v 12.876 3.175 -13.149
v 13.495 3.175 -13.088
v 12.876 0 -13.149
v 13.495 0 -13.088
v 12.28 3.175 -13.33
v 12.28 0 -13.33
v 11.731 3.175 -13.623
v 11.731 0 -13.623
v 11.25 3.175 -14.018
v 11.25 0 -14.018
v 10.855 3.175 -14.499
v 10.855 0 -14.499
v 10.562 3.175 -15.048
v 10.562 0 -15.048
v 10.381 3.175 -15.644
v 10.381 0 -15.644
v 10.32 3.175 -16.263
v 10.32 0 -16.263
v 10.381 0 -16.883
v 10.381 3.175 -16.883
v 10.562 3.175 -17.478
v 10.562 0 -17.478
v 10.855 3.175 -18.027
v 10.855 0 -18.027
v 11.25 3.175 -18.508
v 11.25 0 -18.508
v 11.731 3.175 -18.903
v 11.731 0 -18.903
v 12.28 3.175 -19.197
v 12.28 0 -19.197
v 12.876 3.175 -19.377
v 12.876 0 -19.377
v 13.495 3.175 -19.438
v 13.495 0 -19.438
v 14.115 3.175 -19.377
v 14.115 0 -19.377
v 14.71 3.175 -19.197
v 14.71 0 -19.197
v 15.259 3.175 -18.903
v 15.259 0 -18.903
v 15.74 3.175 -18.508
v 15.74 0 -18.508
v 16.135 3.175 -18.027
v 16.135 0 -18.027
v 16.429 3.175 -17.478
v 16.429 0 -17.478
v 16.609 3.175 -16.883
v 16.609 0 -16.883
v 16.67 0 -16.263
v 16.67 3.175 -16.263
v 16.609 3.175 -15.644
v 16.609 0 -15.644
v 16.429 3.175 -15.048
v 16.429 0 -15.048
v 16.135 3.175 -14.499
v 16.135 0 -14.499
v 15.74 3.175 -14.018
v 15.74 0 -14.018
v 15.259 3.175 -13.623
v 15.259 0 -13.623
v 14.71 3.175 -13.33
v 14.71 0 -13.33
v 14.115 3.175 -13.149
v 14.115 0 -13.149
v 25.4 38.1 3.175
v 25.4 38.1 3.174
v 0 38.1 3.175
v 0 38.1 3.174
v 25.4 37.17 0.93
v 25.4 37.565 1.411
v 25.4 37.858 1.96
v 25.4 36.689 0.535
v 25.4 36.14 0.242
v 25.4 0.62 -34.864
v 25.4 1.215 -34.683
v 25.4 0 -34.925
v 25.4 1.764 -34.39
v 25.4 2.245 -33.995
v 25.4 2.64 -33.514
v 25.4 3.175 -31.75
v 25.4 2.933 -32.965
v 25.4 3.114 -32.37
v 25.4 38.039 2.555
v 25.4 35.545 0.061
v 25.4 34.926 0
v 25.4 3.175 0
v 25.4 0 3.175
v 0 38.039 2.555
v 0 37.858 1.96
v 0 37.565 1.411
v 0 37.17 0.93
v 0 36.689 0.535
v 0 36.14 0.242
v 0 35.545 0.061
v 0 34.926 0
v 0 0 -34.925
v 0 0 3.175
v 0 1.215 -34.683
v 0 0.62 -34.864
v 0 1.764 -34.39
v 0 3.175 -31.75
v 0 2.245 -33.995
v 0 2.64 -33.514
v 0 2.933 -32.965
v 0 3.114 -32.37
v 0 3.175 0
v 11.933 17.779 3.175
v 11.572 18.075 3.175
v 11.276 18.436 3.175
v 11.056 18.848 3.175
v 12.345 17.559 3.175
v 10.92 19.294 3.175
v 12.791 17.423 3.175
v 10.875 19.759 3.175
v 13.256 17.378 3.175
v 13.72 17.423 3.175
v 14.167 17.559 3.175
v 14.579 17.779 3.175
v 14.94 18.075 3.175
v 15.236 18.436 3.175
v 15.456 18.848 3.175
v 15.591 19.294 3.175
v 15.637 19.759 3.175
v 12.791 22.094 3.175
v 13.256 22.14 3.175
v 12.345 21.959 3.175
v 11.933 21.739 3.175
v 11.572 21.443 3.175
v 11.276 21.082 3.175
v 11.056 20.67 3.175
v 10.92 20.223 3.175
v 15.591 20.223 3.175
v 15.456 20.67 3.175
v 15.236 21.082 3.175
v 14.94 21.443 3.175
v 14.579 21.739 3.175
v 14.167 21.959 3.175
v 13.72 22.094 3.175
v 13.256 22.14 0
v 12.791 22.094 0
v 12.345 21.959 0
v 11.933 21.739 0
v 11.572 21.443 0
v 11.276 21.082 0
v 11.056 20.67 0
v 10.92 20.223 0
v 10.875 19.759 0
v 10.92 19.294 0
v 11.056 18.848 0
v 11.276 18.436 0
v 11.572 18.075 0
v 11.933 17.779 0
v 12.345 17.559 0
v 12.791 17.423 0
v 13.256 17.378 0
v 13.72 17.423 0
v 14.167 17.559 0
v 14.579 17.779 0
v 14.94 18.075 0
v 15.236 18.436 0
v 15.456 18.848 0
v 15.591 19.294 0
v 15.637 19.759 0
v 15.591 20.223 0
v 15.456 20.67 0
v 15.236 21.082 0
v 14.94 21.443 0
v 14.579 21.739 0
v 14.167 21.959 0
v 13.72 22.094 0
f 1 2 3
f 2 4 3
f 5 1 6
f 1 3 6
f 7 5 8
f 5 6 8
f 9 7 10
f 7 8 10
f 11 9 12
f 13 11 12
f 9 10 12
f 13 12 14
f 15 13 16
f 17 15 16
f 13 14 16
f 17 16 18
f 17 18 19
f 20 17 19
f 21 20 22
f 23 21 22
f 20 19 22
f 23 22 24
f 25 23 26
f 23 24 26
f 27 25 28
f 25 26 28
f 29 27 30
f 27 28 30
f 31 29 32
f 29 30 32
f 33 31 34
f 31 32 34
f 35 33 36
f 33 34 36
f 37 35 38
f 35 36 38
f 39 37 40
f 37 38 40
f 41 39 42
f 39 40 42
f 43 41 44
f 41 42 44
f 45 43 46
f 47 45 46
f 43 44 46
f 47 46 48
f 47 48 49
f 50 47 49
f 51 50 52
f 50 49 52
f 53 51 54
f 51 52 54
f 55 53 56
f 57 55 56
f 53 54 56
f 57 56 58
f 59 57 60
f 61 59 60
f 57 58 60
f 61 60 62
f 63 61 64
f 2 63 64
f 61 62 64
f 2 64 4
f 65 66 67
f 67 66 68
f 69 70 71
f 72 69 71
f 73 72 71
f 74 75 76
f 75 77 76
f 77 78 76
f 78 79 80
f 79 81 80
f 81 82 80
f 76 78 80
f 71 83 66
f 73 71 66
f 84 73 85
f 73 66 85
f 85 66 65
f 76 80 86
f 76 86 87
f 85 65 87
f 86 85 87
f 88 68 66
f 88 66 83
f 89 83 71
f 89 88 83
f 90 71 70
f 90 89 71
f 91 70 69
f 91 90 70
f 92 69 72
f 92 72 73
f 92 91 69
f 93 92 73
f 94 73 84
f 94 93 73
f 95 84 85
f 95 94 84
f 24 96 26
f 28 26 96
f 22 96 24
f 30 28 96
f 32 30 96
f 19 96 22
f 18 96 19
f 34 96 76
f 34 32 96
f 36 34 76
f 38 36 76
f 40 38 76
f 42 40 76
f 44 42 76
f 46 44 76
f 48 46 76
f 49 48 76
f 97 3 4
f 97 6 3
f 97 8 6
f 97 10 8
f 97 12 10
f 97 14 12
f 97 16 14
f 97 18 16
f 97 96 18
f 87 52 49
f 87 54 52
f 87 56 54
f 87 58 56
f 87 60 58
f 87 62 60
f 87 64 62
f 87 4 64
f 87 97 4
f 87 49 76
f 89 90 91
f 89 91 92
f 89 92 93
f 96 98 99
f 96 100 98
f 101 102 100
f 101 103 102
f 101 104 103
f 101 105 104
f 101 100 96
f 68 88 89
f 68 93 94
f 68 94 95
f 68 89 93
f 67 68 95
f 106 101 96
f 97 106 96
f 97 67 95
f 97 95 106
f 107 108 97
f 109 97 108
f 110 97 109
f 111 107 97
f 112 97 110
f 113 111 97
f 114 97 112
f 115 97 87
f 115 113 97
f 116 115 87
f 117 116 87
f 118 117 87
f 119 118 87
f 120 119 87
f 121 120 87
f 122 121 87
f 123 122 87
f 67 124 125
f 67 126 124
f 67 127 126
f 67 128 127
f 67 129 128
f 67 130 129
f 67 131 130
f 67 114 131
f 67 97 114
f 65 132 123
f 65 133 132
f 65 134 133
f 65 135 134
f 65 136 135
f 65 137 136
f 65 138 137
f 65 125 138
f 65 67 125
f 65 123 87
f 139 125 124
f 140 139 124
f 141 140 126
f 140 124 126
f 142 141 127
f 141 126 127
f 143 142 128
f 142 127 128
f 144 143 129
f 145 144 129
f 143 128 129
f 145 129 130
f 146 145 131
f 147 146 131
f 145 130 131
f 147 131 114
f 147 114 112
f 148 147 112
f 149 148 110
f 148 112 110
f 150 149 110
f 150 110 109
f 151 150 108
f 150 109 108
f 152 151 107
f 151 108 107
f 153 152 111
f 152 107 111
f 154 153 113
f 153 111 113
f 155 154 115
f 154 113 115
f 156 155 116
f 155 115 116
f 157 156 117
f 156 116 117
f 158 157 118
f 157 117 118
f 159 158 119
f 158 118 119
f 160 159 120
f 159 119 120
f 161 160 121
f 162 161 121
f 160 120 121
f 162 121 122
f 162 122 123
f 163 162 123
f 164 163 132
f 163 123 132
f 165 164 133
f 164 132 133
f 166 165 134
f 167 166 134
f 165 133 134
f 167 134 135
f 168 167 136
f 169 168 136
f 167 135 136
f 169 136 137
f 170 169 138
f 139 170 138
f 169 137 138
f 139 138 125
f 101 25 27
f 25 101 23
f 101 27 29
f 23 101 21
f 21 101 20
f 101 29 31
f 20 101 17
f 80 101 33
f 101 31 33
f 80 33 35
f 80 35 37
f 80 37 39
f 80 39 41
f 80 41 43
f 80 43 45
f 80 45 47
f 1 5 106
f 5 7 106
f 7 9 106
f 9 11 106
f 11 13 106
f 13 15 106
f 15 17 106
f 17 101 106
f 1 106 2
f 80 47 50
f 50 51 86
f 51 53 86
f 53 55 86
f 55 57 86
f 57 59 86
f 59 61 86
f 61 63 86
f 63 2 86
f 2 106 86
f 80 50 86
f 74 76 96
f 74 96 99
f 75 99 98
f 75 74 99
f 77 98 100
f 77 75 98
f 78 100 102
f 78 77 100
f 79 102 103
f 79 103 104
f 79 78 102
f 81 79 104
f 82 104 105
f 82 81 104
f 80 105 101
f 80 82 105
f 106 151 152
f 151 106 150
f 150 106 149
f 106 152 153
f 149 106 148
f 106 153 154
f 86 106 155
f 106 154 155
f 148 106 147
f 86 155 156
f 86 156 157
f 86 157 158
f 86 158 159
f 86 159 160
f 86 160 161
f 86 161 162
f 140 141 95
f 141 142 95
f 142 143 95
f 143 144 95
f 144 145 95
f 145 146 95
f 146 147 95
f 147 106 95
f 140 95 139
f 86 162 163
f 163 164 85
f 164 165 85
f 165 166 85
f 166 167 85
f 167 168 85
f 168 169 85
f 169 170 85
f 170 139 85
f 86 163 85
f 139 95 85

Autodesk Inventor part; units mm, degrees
ref_plane "YZ Plane" through (0, 0, 0) normal (1, 0, 0) x (0, 1, 0)
ref_plane "XZ Plane" through (0, 0, 0) normal (0, 1, 0) x (-1, 0, 0)
ref_plane "XY Plane" through (0, 0, 0) normal (0, 0, 1) x (1, 0, 0)
sketch "Sketch1" plane through (0, 0, 0) normal (0, 0, 1) x (1, 0, 0)
  line L0 (0, 0) -> (25.4, 0)
  line L1 (25.4, 0) -> (25.4, 38.1)
  line L2 (25.4, 38.1) -> (0, 38.1)
  line L3 (0, 38.1) -> (0, 0)
  dimension "d0" = 25.4
  dimension "d1" = 38.1
extrude "Extrusion1" add sketch "Sketch1" along normal blind 3.175
fillet "Fillet1" radius 3.175 1 edges at (12.7, 38.1, 0)
sketch "Sketch2" plane through (0, 0, 0) normal (0, 0, -1) x (-1, 0, 0)
  line L0 (0, 0) -> (-25.4, 0) projected
  line L1 (0, 38.1) -> (0, 0) projected
  line L2 (-25.4, 0) -> (0, 0)
  line L3 (0, 0) -> (0, 3.175)
  line L4 (0, 3.175) -> (-25.4, 3.175)
  line L5 (-25.4, 3.175) -> (-25.4, 0)
  dimension "d5" = 3.175
extrude "Extrusion2" add sketch "Sketch2" along normal blind 34.925
fillet "Fillet2" radius 3.175 1 edges at (12.7, 3.175, -34.925)
hole "Hole1" at (13.4954, 3.175, -16.2632) direction (0, -1, 0) diameter 6.35 depth 25.4 tip angle 118
hole "Hole2" at (13.2558, 19.7589, 0) direction (0, 0, 1) diameter 4.7625 depth 25.4 tip angle 118
properties part number "Brackket"
